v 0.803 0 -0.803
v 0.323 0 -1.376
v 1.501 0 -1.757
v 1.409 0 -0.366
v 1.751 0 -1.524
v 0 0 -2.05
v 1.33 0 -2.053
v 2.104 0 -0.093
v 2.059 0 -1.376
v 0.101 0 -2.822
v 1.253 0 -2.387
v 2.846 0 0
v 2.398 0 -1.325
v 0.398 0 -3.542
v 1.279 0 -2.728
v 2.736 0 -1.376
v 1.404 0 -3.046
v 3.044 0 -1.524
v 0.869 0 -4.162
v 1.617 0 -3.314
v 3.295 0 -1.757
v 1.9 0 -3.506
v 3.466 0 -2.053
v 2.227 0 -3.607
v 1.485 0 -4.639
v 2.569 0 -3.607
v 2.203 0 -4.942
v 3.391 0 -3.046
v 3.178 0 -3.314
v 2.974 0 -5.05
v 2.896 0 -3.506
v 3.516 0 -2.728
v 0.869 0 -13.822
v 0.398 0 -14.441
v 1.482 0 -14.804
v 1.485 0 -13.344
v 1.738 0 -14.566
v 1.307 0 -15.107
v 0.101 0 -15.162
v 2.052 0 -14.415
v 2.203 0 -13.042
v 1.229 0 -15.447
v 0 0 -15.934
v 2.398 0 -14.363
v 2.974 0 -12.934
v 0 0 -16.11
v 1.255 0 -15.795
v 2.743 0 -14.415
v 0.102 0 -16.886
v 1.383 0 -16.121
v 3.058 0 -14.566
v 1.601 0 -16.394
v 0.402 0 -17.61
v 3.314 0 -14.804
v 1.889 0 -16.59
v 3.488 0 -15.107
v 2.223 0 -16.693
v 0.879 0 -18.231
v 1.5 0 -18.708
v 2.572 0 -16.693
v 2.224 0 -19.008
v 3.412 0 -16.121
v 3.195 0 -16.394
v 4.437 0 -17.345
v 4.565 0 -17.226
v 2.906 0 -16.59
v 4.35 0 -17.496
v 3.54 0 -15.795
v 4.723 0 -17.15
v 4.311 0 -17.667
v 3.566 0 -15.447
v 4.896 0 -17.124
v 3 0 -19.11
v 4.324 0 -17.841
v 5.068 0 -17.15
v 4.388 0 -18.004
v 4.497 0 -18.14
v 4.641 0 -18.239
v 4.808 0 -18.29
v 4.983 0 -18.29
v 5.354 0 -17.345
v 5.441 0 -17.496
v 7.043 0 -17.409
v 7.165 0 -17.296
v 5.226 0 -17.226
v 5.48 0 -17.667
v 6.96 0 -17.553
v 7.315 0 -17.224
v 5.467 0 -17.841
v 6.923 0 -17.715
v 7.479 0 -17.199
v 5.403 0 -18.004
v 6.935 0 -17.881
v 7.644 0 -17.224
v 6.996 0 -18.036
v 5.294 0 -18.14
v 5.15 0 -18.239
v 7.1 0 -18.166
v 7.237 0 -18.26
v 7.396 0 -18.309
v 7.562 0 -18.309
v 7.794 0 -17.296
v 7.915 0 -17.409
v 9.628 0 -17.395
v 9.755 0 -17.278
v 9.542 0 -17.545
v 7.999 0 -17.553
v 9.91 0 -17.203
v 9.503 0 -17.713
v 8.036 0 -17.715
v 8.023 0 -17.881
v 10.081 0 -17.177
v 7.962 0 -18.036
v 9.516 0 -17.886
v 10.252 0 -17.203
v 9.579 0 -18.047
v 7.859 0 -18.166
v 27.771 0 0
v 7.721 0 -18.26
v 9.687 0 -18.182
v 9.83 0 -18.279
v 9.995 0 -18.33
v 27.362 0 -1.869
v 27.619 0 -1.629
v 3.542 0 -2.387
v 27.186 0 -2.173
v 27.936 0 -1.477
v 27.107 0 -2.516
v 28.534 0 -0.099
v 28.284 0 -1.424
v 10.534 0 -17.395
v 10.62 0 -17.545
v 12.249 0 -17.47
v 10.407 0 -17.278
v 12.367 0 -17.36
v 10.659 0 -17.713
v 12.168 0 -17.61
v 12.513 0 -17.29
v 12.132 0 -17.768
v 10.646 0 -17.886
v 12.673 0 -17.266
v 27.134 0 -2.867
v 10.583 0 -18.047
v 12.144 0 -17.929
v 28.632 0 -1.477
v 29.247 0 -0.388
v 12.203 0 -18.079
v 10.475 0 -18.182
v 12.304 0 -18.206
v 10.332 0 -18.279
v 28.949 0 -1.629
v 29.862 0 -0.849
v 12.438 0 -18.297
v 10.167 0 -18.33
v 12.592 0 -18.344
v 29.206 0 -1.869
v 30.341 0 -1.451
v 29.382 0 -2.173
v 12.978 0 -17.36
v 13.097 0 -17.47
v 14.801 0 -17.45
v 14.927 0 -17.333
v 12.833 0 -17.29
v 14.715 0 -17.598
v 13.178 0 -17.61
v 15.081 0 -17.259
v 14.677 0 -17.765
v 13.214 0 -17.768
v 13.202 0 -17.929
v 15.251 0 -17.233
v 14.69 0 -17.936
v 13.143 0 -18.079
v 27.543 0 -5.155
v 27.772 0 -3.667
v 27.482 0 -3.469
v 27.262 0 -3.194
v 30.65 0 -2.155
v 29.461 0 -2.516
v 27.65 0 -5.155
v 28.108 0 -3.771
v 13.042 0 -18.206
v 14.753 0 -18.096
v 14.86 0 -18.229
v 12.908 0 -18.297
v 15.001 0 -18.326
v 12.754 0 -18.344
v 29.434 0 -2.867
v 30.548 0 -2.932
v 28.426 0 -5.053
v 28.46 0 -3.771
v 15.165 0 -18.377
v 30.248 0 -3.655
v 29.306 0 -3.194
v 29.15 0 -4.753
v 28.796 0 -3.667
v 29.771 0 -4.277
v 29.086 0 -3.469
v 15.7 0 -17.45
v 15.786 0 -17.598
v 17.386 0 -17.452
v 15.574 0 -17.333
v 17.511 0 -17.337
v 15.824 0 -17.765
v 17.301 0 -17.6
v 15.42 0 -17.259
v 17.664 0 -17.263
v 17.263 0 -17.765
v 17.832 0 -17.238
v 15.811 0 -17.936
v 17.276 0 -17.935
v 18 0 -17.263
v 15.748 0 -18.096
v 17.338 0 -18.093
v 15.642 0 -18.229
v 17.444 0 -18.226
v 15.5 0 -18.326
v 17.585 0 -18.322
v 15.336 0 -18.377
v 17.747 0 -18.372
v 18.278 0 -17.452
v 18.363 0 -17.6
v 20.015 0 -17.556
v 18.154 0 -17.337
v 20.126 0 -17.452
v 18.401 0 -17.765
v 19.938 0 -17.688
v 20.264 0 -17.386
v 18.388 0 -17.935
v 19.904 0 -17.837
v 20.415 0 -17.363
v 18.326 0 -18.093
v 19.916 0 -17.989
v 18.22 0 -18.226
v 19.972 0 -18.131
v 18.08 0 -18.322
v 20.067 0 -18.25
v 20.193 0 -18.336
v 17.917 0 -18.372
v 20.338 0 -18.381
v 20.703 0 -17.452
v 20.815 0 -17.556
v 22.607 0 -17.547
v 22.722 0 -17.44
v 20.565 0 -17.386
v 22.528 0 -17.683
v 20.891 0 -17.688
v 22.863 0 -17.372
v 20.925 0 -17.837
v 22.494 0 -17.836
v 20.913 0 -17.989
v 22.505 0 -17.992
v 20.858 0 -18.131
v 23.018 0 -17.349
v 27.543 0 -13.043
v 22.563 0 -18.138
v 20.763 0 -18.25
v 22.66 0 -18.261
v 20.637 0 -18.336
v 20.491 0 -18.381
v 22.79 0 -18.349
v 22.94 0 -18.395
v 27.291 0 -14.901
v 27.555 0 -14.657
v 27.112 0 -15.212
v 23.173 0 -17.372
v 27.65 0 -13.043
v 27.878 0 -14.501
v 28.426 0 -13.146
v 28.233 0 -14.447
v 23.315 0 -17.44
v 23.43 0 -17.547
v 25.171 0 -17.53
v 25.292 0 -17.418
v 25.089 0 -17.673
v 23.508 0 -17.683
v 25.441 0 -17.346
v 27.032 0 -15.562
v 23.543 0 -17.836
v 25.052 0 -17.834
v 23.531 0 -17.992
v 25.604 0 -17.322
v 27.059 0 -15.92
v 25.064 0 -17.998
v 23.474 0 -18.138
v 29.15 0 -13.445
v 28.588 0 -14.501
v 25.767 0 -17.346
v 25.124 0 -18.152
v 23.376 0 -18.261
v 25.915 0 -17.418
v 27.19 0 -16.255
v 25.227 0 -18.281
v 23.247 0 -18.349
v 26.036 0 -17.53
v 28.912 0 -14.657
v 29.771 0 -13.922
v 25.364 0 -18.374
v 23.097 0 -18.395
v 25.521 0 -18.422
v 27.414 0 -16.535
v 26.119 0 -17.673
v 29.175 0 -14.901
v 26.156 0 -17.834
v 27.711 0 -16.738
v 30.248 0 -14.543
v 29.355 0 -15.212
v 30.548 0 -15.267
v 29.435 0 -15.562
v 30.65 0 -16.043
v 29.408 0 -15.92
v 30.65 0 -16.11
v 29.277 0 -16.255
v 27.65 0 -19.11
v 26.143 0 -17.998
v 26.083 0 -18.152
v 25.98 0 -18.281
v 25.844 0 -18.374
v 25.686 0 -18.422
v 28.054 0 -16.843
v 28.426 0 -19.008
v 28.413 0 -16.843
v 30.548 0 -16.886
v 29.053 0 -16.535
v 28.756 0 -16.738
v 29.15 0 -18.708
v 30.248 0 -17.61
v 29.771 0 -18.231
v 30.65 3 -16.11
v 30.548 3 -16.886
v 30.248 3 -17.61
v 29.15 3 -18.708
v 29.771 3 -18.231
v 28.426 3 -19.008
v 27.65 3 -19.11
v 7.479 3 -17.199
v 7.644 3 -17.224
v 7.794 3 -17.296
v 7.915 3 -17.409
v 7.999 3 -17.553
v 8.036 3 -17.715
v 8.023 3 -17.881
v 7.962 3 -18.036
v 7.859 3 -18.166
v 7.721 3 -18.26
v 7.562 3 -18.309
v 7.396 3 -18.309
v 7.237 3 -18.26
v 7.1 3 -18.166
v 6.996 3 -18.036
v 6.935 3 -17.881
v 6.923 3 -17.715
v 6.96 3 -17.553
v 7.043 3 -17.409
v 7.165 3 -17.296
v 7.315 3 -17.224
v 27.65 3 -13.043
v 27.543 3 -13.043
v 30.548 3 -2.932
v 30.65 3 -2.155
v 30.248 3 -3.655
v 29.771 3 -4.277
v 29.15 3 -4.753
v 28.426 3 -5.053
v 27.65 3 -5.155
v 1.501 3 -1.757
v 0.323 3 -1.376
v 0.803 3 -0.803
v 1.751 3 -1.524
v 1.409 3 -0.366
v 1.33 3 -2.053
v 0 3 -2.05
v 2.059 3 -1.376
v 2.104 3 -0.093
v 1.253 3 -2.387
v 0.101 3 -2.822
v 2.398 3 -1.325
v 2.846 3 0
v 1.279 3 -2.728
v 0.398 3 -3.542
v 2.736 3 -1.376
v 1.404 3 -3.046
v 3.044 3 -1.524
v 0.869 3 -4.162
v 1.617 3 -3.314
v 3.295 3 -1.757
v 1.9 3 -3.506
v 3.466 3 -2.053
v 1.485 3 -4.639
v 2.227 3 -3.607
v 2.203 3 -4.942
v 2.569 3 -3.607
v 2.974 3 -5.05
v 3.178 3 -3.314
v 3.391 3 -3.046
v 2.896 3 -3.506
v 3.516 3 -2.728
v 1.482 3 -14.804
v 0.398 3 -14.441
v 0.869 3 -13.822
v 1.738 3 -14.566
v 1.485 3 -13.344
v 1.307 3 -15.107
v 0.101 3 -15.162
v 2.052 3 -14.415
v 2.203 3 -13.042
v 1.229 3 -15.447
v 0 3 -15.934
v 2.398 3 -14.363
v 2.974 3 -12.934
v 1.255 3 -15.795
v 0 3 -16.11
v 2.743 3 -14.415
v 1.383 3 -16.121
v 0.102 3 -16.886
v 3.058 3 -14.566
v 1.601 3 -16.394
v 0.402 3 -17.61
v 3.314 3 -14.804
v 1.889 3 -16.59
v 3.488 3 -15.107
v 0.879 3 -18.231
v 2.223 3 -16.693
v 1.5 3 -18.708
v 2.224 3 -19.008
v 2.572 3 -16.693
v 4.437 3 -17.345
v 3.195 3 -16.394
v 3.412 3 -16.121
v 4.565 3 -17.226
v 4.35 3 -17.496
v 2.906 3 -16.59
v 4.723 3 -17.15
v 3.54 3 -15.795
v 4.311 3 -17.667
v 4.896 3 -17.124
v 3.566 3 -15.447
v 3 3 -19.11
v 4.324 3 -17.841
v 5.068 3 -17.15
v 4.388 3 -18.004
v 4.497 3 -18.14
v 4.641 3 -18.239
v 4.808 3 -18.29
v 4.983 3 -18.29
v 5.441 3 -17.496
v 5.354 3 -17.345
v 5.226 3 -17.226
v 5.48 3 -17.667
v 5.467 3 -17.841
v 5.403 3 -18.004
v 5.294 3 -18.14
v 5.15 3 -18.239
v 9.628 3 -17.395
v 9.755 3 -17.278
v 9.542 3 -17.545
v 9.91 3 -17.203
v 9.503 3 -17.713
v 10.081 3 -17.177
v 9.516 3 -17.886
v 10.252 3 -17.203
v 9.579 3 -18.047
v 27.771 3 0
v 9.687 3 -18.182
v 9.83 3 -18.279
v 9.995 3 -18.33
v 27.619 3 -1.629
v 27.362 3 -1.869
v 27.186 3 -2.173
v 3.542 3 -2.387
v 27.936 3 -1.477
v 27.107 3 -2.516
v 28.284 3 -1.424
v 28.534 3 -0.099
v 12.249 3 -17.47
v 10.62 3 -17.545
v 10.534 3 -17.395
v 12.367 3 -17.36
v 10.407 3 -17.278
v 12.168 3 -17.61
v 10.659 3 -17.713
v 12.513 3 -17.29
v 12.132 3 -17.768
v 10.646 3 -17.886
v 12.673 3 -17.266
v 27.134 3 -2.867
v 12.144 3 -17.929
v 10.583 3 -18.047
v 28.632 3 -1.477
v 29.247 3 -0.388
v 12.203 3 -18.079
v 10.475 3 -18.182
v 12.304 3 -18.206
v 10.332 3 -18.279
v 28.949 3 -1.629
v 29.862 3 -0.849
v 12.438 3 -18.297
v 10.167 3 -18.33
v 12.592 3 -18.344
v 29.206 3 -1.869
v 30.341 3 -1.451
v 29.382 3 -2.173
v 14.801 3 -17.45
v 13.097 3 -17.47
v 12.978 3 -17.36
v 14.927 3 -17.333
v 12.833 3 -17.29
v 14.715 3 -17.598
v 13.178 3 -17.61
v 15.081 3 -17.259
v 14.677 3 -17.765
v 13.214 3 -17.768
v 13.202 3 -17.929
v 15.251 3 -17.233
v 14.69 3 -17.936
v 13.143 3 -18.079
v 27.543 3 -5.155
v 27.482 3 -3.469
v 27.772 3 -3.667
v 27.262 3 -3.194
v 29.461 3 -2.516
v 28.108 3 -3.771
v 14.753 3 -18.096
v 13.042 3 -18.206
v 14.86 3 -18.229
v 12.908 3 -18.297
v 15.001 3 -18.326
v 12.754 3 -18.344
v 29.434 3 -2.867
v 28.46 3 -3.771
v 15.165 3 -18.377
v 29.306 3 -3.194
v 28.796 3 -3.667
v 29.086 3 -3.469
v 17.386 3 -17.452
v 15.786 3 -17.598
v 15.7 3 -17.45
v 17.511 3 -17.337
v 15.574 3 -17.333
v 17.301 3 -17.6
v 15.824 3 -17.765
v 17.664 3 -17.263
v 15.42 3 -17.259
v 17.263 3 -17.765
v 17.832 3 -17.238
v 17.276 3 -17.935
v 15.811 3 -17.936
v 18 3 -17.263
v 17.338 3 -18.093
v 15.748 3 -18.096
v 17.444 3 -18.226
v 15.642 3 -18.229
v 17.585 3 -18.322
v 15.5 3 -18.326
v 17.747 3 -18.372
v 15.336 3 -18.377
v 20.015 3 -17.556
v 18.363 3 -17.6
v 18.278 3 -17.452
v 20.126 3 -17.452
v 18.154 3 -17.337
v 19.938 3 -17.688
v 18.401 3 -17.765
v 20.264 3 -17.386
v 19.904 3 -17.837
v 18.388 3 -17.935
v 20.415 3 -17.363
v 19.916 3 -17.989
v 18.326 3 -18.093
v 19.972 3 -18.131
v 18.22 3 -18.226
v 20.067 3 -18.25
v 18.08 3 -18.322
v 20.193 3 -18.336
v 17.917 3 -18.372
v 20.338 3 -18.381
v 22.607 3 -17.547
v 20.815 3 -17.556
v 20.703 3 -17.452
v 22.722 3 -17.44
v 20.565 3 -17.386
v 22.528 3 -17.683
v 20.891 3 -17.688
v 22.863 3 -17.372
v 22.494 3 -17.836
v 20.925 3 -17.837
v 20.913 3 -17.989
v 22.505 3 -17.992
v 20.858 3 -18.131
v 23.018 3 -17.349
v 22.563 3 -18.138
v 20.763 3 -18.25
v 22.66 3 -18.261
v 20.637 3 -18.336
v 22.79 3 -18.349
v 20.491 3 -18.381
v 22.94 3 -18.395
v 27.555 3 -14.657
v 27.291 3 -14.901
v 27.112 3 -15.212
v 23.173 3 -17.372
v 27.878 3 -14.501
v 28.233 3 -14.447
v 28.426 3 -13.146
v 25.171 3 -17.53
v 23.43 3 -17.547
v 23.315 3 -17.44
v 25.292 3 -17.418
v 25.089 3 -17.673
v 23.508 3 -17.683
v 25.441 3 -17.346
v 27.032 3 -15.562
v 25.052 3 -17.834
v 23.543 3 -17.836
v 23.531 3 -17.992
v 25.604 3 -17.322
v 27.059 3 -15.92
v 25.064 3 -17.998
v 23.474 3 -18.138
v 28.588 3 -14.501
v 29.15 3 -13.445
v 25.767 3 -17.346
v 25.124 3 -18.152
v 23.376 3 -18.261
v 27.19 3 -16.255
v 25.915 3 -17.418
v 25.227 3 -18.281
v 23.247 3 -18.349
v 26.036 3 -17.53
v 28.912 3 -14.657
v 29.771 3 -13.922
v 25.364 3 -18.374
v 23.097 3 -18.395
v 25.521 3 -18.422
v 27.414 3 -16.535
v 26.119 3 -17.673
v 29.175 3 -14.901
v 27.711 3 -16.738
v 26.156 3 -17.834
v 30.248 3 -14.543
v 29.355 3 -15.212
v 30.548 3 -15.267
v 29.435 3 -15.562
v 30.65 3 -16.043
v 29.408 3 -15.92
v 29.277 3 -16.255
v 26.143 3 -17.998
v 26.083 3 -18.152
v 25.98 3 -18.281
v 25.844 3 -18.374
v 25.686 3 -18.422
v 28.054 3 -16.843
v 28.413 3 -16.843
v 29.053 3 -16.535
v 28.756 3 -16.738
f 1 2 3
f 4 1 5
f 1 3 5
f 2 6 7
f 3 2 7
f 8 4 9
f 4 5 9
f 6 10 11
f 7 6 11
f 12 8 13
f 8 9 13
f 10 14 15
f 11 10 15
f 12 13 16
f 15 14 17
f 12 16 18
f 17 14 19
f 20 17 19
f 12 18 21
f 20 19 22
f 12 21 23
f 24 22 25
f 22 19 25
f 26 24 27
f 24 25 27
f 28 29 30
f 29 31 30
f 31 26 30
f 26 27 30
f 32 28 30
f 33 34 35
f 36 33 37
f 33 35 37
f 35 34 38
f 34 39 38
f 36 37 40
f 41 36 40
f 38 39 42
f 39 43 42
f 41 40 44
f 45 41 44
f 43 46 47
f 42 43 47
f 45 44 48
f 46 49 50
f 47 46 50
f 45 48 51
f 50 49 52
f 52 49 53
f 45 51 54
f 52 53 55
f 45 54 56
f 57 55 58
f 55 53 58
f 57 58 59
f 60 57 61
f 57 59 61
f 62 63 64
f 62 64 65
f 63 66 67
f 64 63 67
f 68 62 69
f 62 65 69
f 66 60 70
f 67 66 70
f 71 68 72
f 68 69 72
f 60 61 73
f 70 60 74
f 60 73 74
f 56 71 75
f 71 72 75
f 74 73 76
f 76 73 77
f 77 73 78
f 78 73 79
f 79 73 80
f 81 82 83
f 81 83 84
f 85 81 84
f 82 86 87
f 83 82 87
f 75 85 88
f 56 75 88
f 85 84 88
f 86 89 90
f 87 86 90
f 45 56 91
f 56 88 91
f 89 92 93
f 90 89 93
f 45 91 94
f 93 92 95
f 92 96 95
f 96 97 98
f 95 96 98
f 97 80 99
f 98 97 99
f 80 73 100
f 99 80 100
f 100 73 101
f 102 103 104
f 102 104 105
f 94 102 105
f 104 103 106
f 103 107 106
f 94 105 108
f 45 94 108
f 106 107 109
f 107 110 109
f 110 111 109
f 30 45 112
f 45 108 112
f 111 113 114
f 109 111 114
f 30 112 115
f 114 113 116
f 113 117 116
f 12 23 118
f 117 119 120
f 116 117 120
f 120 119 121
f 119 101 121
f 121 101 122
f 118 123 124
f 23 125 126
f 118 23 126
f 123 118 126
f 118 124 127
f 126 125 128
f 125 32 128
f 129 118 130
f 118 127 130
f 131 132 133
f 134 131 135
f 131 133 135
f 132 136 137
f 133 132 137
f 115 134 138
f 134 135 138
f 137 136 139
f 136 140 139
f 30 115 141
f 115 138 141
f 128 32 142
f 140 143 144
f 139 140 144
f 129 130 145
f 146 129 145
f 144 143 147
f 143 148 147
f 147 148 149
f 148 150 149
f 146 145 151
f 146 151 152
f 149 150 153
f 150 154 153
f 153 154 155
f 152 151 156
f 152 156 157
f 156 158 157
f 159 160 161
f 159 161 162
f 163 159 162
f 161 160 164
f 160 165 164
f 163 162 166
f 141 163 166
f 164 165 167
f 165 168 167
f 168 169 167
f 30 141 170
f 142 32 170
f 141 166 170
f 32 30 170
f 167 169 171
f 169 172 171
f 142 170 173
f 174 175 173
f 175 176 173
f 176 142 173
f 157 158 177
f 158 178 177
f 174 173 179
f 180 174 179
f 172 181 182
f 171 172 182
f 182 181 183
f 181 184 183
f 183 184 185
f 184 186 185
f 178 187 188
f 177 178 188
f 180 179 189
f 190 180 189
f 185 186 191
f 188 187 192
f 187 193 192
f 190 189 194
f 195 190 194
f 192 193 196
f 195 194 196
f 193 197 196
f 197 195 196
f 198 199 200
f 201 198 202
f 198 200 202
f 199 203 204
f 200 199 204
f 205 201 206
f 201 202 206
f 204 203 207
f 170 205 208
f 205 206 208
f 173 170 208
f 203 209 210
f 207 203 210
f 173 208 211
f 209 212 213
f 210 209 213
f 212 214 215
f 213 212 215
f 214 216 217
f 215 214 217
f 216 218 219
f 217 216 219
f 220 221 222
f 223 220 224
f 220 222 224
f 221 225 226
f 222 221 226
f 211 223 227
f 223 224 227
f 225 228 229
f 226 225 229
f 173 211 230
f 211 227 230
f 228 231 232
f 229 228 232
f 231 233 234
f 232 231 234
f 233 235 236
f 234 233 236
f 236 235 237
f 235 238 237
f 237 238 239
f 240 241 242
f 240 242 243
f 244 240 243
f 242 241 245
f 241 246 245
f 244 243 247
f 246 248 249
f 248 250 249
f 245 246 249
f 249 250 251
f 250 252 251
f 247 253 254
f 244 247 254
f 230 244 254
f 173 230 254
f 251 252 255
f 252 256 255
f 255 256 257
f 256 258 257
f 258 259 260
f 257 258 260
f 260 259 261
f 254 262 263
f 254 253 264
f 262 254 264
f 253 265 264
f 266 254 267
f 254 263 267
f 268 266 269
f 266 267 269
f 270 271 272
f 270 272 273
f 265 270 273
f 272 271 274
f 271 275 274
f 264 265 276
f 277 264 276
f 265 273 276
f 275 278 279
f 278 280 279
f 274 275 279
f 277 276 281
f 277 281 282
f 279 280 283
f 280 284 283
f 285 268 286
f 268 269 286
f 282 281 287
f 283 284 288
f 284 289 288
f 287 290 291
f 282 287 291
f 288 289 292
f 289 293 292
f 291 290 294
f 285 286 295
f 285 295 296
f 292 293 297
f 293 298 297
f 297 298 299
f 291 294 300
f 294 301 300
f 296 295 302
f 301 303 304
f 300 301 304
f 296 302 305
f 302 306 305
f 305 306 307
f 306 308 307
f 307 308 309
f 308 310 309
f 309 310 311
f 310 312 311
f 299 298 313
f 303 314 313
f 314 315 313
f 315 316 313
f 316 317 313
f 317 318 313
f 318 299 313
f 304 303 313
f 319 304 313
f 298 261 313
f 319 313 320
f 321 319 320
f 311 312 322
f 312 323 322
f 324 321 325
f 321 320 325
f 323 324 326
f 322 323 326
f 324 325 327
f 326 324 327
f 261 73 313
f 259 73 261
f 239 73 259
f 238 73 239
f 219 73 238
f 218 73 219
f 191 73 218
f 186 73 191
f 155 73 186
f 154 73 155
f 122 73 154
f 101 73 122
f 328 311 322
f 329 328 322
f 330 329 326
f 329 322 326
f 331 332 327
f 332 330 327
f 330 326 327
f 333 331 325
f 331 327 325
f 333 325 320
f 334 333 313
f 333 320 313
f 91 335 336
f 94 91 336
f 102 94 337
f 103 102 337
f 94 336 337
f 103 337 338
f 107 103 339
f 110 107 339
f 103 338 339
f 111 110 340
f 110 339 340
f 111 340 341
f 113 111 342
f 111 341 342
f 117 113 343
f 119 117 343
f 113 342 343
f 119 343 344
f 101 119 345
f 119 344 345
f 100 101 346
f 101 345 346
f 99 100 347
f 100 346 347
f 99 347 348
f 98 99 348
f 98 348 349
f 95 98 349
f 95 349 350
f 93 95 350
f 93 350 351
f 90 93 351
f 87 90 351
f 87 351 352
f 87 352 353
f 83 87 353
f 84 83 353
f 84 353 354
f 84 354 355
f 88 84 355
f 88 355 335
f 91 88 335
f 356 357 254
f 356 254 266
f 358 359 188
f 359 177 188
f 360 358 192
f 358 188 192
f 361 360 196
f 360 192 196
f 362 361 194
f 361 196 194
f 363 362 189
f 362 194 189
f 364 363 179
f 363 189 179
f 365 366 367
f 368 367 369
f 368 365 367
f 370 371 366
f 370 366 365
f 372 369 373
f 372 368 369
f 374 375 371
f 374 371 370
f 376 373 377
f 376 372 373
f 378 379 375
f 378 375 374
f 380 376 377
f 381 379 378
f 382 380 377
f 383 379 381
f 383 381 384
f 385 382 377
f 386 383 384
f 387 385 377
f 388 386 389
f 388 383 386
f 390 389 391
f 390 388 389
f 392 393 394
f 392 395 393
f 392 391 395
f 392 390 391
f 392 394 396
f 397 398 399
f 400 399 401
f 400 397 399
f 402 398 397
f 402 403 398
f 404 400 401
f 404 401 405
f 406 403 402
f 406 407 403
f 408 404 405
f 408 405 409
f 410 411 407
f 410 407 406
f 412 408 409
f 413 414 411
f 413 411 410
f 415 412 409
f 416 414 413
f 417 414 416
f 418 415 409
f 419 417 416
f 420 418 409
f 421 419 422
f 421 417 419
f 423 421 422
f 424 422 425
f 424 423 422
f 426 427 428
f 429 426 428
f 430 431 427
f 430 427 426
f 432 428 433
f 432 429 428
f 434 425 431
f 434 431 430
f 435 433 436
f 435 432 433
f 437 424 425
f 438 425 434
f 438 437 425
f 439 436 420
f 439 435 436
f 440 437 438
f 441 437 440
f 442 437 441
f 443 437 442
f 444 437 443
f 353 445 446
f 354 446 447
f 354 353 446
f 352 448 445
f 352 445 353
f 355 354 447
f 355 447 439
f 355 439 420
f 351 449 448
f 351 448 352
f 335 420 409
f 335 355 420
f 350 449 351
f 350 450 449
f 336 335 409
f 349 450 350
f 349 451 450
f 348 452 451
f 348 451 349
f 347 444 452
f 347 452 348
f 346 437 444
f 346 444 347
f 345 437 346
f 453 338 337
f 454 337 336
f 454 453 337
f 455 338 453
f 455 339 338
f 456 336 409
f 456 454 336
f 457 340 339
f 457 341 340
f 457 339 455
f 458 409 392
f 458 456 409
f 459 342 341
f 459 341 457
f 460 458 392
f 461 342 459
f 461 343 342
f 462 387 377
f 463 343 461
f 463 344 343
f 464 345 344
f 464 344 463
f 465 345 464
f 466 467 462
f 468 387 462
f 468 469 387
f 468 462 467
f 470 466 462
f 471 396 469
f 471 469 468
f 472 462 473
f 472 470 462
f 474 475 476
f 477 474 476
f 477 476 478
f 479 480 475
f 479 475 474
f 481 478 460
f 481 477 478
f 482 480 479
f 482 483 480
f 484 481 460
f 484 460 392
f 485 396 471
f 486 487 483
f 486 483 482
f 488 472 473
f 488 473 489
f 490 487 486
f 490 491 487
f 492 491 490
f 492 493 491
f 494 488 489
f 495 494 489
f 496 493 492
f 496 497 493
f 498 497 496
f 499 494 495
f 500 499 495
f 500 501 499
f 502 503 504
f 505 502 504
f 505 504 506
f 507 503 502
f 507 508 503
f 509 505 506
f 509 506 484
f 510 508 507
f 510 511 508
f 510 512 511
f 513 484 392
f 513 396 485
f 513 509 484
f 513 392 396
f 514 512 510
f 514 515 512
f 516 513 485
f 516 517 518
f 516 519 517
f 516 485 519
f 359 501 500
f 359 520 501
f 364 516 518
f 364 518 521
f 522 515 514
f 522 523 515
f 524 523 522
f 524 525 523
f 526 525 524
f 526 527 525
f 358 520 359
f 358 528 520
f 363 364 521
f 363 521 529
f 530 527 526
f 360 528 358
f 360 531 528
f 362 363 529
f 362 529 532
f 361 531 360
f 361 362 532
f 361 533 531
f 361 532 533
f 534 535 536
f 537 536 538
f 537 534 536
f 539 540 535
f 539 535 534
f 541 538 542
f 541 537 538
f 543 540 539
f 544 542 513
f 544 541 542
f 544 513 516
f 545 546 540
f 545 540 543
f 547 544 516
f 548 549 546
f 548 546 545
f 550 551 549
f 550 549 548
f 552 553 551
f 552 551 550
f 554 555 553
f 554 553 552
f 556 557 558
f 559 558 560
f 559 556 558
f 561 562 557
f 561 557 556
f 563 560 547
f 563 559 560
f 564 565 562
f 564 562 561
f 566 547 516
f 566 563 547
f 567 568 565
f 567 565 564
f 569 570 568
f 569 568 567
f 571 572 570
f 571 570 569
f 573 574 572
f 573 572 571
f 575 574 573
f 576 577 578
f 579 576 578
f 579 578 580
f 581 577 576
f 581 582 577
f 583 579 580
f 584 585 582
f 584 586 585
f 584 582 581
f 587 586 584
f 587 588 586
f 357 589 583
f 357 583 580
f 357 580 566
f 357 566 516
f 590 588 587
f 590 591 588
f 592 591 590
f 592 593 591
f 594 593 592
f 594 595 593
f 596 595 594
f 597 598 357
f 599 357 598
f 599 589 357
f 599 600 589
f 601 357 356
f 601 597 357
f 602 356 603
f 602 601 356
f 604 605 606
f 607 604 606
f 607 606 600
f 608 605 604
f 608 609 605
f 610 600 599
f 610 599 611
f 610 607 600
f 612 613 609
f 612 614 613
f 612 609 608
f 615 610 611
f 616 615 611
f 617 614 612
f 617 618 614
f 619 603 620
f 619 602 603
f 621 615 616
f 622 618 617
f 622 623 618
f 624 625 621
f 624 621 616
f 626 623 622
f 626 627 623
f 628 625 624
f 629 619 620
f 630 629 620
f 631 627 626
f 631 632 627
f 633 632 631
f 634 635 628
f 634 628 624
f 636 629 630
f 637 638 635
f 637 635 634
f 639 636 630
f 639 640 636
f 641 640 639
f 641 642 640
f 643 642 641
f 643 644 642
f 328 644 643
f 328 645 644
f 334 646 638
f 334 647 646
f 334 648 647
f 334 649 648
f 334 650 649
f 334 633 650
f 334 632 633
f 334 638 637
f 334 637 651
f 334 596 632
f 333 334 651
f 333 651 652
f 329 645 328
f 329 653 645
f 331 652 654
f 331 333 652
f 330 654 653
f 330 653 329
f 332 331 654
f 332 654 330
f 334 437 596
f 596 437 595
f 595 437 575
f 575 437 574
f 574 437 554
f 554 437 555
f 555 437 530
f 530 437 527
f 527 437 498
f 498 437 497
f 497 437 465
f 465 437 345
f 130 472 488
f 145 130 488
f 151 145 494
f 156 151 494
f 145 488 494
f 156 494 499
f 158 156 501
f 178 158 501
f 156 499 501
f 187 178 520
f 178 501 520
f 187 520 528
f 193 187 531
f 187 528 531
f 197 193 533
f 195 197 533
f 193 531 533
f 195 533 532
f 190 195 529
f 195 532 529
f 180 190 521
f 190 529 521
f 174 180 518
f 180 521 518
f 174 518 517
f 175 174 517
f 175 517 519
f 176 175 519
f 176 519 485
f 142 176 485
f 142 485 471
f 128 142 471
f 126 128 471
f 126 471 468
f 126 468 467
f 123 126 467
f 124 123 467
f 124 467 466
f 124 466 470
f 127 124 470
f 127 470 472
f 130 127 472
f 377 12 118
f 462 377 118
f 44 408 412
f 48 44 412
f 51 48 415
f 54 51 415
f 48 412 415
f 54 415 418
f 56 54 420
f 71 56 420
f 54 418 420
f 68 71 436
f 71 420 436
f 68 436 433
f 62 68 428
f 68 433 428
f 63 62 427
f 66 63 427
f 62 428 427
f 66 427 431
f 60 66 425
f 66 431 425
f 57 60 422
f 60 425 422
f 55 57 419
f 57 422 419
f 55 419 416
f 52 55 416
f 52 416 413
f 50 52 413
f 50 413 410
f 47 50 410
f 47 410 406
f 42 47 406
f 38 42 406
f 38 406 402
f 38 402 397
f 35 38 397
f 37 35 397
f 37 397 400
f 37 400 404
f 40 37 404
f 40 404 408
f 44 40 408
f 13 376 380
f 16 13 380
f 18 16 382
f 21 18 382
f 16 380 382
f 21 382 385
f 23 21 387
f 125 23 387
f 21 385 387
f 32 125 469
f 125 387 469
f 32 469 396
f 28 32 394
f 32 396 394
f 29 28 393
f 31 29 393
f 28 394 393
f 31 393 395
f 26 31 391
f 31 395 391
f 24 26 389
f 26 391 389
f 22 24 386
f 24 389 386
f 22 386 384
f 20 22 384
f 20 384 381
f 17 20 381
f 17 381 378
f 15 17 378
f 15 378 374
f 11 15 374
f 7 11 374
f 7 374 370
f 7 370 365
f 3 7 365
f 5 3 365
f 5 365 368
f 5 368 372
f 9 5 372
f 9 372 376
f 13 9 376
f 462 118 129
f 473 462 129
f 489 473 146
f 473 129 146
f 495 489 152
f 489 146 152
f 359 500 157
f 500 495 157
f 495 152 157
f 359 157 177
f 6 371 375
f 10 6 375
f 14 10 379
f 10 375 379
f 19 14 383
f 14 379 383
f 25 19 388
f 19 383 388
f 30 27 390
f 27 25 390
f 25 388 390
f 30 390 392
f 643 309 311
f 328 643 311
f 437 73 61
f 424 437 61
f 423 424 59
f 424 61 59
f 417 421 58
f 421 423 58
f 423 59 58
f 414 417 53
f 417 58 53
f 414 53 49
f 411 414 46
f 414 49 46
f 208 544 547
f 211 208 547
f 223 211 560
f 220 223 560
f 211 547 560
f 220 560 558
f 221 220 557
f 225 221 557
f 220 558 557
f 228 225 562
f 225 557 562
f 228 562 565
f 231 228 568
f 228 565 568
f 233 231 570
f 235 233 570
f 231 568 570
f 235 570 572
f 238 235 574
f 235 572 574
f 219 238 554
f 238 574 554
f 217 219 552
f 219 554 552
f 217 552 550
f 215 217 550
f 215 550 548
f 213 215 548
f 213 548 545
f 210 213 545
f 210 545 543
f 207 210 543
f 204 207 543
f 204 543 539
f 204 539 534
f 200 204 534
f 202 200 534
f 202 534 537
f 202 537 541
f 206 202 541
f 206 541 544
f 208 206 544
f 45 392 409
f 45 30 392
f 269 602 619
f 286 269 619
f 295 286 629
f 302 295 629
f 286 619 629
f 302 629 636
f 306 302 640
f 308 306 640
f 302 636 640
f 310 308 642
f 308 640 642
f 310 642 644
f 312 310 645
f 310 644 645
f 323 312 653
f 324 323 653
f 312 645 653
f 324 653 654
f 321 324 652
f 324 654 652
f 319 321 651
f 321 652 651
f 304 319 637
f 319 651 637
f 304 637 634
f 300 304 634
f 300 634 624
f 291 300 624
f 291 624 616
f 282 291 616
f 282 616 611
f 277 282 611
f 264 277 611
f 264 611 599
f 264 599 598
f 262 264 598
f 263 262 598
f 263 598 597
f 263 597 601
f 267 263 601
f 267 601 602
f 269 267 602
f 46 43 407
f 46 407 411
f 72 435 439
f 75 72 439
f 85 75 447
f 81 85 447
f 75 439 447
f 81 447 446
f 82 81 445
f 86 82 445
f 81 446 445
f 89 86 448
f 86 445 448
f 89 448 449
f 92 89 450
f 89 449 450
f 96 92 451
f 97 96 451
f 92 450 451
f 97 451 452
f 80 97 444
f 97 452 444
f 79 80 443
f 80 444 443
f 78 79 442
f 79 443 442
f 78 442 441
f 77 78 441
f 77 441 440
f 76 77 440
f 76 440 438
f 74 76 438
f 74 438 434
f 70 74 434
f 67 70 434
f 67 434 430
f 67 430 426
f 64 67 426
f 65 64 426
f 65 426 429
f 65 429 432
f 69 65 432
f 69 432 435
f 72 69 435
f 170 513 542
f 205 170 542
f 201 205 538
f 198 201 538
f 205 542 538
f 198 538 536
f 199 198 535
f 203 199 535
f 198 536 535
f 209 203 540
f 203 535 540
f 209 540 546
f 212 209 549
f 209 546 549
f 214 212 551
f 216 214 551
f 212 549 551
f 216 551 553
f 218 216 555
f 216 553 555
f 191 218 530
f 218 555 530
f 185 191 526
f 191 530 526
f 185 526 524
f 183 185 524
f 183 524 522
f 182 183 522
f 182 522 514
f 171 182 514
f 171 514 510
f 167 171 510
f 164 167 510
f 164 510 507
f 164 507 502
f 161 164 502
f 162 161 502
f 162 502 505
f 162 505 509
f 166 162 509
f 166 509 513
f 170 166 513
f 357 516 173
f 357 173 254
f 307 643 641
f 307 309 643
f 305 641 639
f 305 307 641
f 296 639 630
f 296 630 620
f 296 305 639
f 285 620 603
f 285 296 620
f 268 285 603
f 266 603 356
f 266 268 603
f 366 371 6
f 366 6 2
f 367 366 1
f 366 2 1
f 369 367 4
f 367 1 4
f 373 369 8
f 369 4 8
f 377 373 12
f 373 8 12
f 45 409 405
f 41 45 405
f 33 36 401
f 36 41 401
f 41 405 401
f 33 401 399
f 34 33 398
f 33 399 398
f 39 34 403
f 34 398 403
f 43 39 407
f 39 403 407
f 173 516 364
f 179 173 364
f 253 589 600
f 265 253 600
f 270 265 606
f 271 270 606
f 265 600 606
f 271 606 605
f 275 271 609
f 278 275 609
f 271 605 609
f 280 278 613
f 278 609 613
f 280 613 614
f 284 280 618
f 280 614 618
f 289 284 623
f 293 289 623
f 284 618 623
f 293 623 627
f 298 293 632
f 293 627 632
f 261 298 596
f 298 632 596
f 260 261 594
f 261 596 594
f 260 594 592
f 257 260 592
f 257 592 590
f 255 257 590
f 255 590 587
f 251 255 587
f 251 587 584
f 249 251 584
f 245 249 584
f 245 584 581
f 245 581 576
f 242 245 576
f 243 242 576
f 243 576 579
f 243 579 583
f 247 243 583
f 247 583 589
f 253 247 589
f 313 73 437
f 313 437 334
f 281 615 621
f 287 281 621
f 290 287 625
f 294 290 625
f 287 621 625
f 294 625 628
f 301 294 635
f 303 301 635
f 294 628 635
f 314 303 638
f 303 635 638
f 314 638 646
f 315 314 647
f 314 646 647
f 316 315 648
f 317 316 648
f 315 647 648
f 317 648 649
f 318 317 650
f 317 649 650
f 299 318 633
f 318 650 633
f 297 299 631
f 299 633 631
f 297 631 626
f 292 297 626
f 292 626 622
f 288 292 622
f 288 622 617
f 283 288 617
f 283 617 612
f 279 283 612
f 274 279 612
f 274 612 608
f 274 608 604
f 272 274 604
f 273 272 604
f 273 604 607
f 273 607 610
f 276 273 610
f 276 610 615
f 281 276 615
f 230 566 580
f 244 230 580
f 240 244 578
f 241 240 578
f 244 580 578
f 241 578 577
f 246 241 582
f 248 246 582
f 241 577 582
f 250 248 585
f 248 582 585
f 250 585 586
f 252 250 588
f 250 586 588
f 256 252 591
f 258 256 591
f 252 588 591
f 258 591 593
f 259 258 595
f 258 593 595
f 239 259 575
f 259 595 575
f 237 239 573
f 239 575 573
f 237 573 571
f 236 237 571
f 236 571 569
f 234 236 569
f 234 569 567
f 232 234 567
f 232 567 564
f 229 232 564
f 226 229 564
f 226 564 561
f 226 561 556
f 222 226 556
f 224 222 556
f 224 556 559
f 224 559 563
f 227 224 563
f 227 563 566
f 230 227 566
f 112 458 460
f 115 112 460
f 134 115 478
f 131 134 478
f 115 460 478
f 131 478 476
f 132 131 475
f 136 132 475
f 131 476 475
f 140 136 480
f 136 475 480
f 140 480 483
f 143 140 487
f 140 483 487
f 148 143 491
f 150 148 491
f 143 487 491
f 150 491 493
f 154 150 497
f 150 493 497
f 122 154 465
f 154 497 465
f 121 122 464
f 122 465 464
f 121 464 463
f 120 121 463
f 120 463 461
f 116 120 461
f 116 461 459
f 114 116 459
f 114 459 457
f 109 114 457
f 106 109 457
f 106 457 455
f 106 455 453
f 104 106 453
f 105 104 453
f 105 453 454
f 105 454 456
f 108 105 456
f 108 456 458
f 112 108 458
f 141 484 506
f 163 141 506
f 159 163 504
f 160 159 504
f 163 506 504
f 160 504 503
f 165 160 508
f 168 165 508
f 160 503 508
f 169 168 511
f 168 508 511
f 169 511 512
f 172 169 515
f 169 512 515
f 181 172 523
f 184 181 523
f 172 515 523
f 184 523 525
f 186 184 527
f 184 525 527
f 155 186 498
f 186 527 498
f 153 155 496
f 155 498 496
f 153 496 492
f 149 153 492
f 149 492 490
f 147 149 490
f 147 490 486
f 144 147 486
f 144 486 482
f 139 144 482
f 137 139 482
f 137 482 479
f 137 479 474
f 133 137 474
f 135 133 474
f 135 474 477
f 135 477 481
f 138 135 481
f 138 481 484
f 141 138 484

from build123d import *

# Parameters (mm, degrees)
SKETCH1_W           = 30.65
SKETCH1_H           = 19.11
BOSS_EXTRUDE1_DEPTH = 3
SKETCH4_W           = 3.107341839
SKETCH4_H           = 7.887877928
CUT_EXTRUDE1_DEPTH  = 37.243821542
FILLET5_R           = 3
SKETCH5_W           = 2.973903927
SKETCH5_H           = 7.883841559
CUT_EXTRUDE2_DEPTH  = 37.243821542
FILLET6_R           = 3
FILLET7_R           = 3
SKETCH6_R           = 1.147476531
SKETCH6_R_2         = 1.171812298
SKETCH6_R_3         = 1.204786214
SKETCH6_R_4         = 1.179845326
CUT_EXTRUDE3_DEPTH  = 37.243821542
SKETCH7_R           = 0.553427196
SKETCH7_R_2         = 0.52616078
SKETCH7_R_3         = 0.51162232
SKETCH7_R_4         = 0.570497963
SKETCH7_R_5         = 0.574861319
SKETCH7_R_6         = 0.542267602
SKETCH7_R_7         = 0.579469216
SKETCH7_R_8         = 0.558015666
SKETCH7_R_9         = 0.586205708
CUT_EXTRUDE4_DEPTH  = 37.243821542


with BuildPart() as part:
    # Sketch1 → Boss-Extrude1 (new body)
    with BuildSketch(Plane(origin=(0, 0, 0), x_dir=(1, 0, 0), z_dir=(0, 1, 0))):
        with Locations((15.325, 9.555)):
            Rectangle(SKETCH1_W, SKETCH1_H)
    extrude(amount=BOSS_EXTRUDE1_DEPTH)

    # Sketch4 → Cut-Extrude1 (cut, through all)
    with BuildSketch(Plane(origin=(0, 3, 0), x_dir=(1, 0, 0), z_dir=(0, 1, 0))):
        with Locations((29.096329081, 9.099362482)):
            Rectangle(SKETCH4_W, SKETCH4_H)
    extrude(amount=-CUT_EXTRUDE1_DEPTH, mode=Mode.SUBTRACT)

    # Fillet5
    fillet5_edges = [part.edges().sort_by_distance(p)[0] for p in [
        (30.65, 1.5, -13.043301446),
        (30.65, 1.5, -5.155423518),
    ]]
    fillet(fillet5_edges, radius=FILLET5_R)

    # Sketch5 → Cut-Extrude2 (cut, through all)
    with BuildSketch(Plane(origin=(0, 3, 0), x_dir=(1, 0, 0), z_dir=(0, 1, 0))):
        with Locations((1.486951964, 8.991865097)):
            Rectangle(SKETCH5_W, SKETCH5_H)
    extrude(amount=-CUT_EXTRUDE2_DEPTH, mode=Mode.SUBTRACT)

    # Fillet6
    # the kernel refuses this fillet: 3 mm, written as the material it takes off along each edge
    with BuildSketch(Plane(origin=(0, 10.5, -12.933785877), x_dir=(1, 0, 0), z_dir=(0, -1, 0))) as fillet6_piece_1_section:
        with BuildLine():
            CenterArc((FILLET6_R, -FILLET6_R), FILLET6_R, 90, 90)
            Line((0, -FILLET6_R), (0, 0))
            Line((0, 0), (FILLET6_R, 0))
        make_face()
    fillet6_piece_1 = extrude(amount=18, mode=Mode.PRIVATE)
    fillet6_piece_1 = split(fillet6_piece_1, bisect_by=Plane(origin=(2.973903927, 10.5, -12.933785877), z_dir=(-1, 0, 0)), keep=Keep.TOP, mode=Mode.PRIVATE)
    add(fillet6_piece_1, mode=Mode.SUBTRACT)
    with BuildSketch(Plane(origin=(0, 10.5, -5.049944318), x_dir=(0, 0, 1), z_dir=(0, -1, 0))) as fillet6_piece_2_section:
        with BuildLine():
            CenterArc((FILLET6_R, -FILLET6_R), FILLET6_R, 90, 90)
            Line((0, -FILLET6_R), (0, 0))
            Line((0, 0), (FILLET6_R, 0))
        make_face()
    fillet6_piece_2 = extrude(amount=18, mode=Mode.PRIVATE)
    fillet6_piece_2 = split(fillet6_piece_2, bisect_by=Plane(origin=(2.973903927, 10.5, -5.049944318), z_dir=(-1, 0, 0)), keep=Keep.TOP, mode=Mode.PRIVATE)
    add(fillet6_piece_2, mode=Mode.SUBTRACT)

    # Fillet7
    # the kernel refuses this fillet: 3 mm, written as the material it takes off along each edge
    with BuildSketch(Plane(origin=(0, -7.5, -19.11), x_dir=(0, 0, 1), z_dir=(0, 1, 0)), Plane(origin=(30.65, -7.5, -19.11), x_dir=(-1, 0, 0), z_dir=(0, 1, 0))) as fillet7_piece_1:
        with BuildLine():
            CenterArc((FILLET7_R, FILLET7_R), FILLET7_R, 180, 90)
            Line((0, FILLET7_R), (-FILLET7_R * 0.02, FILLET7_R))
            Line((-FILLET7_R * 0.02, FILLET7_R), (-FILLET7_R * 0.02, -FILLET7_R * 0.02))
            Line((-FILLET7_R * 0.02, -FILLET7_R * 0.02), (FILLET7_R, -FILLET7_R * 0.02))
            Line((FILLET7_R, -FILLET7_R * 0.02), (FILLET7_R, 0))
        make_face()
    extrude(amount=18, mode=Mode.SUBTRACT)
    with BuildSketch(Plane(origin=(30.65, -7.196653113, 0), x_dir=(0, 0, -1), z_dir=(0, 1, 0))) as fillet7_piece_2:
        with BuildLine():
            CenterArc((3, 2.878661245), FILLET7_R, 180, 73.64872792)
            Line((0, 2.878661245), (-0.06, 2.878661245))
            Line((-0.06, 2.878661245), (-0.06, 0))
            Line((-0.06, 0), (0, -0.06))
            ThreePointArc((0, -0.06), (1.077711759, -0.06), (2.138531988, -0.057573225))
            Line((2.138531988, -0.057573225), (2.155423518, 0))
        make_face()
    extrude(amount=17.393306227, mode=Mode.SUBTRACT)
    with BuildSketch(Plane(origin=(0, -7.113980163, 0), x_dir=(0, 0, -1), z_dir=(0, 1, 0))) as fillet7_piece_3:
        with BuildLine():
            CenterArc((3, -2.845592065), FILLET7_R, 108.462579453, 71.537420547)
            Line((0, -2.845592065), (-0.06, -2.845592065))
            Line((-0.06, -2.845592065), (-0.06, 0))
            Line((-0.06, 0), (0, 0.06))
            ThreePointArc((0, 0.06), (1.024972159, 0.06), (2.030943204, 0.056911841))
            Line((2.030943204, 0.056911841), (2.049944318, 0))
        make_face()
    extrude(amount=17.227960325, mode=Mode.SUBTRACT)

    # Sketch6 → Cut-Extrude3 (cut, through all)
    with BuildSketch(Plane(origin=(0, 3, 0), x_dir=(1, 0, 0), z_dir=(0, 1, 0))):
        with Locations(Location((2.397675936, 2.472562033, 0), (0, 0, 270))):
            Circle(SKETCH6_R)
        with Locations(Location((2.397675936, 15.534628547, 0), (0, 0, 270))):
            Circle(SKETCH6_R_2)
        with Locations(Location((28.233356839, 15.652120685, 0), (0, 0, 270))):
            Circle(SKETCH6_R_3)
        with Locations(Location((28.283999857, 2.604300321, 0), (0, 0, 270))):
            Circle(SKETCH6_R_4)
    extrude(amount=-CUT_EXTRUDE3_DEPTH, mode=Mode.SUBTRACT)

    # Sketch7 → Cut-Extrude4 (cut, through all)
    with BuildSketch(Plane(origin=(0, 3, 0), x_dir=(1, 0, 0), z_dir=(0, 1, 0))):
        with Locations(Location((25.603735312, 17.875013179, 0), (0, 0, 270))):
            Circle(SKETCH7_R)
        with Locations(Location((23.018273663, 17.875013179, 0), (0, 0, 270))):
            Circle(SKETCH7_R_2)
        with Locations(Location((20.414641054, 17.875013179, 0), (0, 0, 270))):
            Circle(SKETCH7_R_3)
        with Locations(Location((17.832185275, 17.808085307, 0), (0, 0, 270))):
            Circle(SKETCH7_R_4)
        with Locations(Location((15.250588263, 17.808085307, 0), (0, 0, 270))):
            Circle(SKETCH7_R_5)
        with Locations(Location((12.672951441, 17.808085307, 0), (0, 0, 270))):
            Circle(SKETCH7_R_6)
        with Locations(Location((10.081016635, 17.756783748, 0), (0, 0, 270))):
            Circle(SKETCH7_R_7)
        with Locations(Location((7.479204756, 17.756783748, 0), (0, 0, 270))):
            Circle(SKETCH7_R_8)
        with Locations(Location((4.895679995, 17.710489857, 0), (0, 0, 270))):
            Circle(SKETCH7_R_9)
    extrude(amount=-CUT_EXTRUDE4_DEPTH, mode=Mode.SUBTRACT)


solid = part.part
